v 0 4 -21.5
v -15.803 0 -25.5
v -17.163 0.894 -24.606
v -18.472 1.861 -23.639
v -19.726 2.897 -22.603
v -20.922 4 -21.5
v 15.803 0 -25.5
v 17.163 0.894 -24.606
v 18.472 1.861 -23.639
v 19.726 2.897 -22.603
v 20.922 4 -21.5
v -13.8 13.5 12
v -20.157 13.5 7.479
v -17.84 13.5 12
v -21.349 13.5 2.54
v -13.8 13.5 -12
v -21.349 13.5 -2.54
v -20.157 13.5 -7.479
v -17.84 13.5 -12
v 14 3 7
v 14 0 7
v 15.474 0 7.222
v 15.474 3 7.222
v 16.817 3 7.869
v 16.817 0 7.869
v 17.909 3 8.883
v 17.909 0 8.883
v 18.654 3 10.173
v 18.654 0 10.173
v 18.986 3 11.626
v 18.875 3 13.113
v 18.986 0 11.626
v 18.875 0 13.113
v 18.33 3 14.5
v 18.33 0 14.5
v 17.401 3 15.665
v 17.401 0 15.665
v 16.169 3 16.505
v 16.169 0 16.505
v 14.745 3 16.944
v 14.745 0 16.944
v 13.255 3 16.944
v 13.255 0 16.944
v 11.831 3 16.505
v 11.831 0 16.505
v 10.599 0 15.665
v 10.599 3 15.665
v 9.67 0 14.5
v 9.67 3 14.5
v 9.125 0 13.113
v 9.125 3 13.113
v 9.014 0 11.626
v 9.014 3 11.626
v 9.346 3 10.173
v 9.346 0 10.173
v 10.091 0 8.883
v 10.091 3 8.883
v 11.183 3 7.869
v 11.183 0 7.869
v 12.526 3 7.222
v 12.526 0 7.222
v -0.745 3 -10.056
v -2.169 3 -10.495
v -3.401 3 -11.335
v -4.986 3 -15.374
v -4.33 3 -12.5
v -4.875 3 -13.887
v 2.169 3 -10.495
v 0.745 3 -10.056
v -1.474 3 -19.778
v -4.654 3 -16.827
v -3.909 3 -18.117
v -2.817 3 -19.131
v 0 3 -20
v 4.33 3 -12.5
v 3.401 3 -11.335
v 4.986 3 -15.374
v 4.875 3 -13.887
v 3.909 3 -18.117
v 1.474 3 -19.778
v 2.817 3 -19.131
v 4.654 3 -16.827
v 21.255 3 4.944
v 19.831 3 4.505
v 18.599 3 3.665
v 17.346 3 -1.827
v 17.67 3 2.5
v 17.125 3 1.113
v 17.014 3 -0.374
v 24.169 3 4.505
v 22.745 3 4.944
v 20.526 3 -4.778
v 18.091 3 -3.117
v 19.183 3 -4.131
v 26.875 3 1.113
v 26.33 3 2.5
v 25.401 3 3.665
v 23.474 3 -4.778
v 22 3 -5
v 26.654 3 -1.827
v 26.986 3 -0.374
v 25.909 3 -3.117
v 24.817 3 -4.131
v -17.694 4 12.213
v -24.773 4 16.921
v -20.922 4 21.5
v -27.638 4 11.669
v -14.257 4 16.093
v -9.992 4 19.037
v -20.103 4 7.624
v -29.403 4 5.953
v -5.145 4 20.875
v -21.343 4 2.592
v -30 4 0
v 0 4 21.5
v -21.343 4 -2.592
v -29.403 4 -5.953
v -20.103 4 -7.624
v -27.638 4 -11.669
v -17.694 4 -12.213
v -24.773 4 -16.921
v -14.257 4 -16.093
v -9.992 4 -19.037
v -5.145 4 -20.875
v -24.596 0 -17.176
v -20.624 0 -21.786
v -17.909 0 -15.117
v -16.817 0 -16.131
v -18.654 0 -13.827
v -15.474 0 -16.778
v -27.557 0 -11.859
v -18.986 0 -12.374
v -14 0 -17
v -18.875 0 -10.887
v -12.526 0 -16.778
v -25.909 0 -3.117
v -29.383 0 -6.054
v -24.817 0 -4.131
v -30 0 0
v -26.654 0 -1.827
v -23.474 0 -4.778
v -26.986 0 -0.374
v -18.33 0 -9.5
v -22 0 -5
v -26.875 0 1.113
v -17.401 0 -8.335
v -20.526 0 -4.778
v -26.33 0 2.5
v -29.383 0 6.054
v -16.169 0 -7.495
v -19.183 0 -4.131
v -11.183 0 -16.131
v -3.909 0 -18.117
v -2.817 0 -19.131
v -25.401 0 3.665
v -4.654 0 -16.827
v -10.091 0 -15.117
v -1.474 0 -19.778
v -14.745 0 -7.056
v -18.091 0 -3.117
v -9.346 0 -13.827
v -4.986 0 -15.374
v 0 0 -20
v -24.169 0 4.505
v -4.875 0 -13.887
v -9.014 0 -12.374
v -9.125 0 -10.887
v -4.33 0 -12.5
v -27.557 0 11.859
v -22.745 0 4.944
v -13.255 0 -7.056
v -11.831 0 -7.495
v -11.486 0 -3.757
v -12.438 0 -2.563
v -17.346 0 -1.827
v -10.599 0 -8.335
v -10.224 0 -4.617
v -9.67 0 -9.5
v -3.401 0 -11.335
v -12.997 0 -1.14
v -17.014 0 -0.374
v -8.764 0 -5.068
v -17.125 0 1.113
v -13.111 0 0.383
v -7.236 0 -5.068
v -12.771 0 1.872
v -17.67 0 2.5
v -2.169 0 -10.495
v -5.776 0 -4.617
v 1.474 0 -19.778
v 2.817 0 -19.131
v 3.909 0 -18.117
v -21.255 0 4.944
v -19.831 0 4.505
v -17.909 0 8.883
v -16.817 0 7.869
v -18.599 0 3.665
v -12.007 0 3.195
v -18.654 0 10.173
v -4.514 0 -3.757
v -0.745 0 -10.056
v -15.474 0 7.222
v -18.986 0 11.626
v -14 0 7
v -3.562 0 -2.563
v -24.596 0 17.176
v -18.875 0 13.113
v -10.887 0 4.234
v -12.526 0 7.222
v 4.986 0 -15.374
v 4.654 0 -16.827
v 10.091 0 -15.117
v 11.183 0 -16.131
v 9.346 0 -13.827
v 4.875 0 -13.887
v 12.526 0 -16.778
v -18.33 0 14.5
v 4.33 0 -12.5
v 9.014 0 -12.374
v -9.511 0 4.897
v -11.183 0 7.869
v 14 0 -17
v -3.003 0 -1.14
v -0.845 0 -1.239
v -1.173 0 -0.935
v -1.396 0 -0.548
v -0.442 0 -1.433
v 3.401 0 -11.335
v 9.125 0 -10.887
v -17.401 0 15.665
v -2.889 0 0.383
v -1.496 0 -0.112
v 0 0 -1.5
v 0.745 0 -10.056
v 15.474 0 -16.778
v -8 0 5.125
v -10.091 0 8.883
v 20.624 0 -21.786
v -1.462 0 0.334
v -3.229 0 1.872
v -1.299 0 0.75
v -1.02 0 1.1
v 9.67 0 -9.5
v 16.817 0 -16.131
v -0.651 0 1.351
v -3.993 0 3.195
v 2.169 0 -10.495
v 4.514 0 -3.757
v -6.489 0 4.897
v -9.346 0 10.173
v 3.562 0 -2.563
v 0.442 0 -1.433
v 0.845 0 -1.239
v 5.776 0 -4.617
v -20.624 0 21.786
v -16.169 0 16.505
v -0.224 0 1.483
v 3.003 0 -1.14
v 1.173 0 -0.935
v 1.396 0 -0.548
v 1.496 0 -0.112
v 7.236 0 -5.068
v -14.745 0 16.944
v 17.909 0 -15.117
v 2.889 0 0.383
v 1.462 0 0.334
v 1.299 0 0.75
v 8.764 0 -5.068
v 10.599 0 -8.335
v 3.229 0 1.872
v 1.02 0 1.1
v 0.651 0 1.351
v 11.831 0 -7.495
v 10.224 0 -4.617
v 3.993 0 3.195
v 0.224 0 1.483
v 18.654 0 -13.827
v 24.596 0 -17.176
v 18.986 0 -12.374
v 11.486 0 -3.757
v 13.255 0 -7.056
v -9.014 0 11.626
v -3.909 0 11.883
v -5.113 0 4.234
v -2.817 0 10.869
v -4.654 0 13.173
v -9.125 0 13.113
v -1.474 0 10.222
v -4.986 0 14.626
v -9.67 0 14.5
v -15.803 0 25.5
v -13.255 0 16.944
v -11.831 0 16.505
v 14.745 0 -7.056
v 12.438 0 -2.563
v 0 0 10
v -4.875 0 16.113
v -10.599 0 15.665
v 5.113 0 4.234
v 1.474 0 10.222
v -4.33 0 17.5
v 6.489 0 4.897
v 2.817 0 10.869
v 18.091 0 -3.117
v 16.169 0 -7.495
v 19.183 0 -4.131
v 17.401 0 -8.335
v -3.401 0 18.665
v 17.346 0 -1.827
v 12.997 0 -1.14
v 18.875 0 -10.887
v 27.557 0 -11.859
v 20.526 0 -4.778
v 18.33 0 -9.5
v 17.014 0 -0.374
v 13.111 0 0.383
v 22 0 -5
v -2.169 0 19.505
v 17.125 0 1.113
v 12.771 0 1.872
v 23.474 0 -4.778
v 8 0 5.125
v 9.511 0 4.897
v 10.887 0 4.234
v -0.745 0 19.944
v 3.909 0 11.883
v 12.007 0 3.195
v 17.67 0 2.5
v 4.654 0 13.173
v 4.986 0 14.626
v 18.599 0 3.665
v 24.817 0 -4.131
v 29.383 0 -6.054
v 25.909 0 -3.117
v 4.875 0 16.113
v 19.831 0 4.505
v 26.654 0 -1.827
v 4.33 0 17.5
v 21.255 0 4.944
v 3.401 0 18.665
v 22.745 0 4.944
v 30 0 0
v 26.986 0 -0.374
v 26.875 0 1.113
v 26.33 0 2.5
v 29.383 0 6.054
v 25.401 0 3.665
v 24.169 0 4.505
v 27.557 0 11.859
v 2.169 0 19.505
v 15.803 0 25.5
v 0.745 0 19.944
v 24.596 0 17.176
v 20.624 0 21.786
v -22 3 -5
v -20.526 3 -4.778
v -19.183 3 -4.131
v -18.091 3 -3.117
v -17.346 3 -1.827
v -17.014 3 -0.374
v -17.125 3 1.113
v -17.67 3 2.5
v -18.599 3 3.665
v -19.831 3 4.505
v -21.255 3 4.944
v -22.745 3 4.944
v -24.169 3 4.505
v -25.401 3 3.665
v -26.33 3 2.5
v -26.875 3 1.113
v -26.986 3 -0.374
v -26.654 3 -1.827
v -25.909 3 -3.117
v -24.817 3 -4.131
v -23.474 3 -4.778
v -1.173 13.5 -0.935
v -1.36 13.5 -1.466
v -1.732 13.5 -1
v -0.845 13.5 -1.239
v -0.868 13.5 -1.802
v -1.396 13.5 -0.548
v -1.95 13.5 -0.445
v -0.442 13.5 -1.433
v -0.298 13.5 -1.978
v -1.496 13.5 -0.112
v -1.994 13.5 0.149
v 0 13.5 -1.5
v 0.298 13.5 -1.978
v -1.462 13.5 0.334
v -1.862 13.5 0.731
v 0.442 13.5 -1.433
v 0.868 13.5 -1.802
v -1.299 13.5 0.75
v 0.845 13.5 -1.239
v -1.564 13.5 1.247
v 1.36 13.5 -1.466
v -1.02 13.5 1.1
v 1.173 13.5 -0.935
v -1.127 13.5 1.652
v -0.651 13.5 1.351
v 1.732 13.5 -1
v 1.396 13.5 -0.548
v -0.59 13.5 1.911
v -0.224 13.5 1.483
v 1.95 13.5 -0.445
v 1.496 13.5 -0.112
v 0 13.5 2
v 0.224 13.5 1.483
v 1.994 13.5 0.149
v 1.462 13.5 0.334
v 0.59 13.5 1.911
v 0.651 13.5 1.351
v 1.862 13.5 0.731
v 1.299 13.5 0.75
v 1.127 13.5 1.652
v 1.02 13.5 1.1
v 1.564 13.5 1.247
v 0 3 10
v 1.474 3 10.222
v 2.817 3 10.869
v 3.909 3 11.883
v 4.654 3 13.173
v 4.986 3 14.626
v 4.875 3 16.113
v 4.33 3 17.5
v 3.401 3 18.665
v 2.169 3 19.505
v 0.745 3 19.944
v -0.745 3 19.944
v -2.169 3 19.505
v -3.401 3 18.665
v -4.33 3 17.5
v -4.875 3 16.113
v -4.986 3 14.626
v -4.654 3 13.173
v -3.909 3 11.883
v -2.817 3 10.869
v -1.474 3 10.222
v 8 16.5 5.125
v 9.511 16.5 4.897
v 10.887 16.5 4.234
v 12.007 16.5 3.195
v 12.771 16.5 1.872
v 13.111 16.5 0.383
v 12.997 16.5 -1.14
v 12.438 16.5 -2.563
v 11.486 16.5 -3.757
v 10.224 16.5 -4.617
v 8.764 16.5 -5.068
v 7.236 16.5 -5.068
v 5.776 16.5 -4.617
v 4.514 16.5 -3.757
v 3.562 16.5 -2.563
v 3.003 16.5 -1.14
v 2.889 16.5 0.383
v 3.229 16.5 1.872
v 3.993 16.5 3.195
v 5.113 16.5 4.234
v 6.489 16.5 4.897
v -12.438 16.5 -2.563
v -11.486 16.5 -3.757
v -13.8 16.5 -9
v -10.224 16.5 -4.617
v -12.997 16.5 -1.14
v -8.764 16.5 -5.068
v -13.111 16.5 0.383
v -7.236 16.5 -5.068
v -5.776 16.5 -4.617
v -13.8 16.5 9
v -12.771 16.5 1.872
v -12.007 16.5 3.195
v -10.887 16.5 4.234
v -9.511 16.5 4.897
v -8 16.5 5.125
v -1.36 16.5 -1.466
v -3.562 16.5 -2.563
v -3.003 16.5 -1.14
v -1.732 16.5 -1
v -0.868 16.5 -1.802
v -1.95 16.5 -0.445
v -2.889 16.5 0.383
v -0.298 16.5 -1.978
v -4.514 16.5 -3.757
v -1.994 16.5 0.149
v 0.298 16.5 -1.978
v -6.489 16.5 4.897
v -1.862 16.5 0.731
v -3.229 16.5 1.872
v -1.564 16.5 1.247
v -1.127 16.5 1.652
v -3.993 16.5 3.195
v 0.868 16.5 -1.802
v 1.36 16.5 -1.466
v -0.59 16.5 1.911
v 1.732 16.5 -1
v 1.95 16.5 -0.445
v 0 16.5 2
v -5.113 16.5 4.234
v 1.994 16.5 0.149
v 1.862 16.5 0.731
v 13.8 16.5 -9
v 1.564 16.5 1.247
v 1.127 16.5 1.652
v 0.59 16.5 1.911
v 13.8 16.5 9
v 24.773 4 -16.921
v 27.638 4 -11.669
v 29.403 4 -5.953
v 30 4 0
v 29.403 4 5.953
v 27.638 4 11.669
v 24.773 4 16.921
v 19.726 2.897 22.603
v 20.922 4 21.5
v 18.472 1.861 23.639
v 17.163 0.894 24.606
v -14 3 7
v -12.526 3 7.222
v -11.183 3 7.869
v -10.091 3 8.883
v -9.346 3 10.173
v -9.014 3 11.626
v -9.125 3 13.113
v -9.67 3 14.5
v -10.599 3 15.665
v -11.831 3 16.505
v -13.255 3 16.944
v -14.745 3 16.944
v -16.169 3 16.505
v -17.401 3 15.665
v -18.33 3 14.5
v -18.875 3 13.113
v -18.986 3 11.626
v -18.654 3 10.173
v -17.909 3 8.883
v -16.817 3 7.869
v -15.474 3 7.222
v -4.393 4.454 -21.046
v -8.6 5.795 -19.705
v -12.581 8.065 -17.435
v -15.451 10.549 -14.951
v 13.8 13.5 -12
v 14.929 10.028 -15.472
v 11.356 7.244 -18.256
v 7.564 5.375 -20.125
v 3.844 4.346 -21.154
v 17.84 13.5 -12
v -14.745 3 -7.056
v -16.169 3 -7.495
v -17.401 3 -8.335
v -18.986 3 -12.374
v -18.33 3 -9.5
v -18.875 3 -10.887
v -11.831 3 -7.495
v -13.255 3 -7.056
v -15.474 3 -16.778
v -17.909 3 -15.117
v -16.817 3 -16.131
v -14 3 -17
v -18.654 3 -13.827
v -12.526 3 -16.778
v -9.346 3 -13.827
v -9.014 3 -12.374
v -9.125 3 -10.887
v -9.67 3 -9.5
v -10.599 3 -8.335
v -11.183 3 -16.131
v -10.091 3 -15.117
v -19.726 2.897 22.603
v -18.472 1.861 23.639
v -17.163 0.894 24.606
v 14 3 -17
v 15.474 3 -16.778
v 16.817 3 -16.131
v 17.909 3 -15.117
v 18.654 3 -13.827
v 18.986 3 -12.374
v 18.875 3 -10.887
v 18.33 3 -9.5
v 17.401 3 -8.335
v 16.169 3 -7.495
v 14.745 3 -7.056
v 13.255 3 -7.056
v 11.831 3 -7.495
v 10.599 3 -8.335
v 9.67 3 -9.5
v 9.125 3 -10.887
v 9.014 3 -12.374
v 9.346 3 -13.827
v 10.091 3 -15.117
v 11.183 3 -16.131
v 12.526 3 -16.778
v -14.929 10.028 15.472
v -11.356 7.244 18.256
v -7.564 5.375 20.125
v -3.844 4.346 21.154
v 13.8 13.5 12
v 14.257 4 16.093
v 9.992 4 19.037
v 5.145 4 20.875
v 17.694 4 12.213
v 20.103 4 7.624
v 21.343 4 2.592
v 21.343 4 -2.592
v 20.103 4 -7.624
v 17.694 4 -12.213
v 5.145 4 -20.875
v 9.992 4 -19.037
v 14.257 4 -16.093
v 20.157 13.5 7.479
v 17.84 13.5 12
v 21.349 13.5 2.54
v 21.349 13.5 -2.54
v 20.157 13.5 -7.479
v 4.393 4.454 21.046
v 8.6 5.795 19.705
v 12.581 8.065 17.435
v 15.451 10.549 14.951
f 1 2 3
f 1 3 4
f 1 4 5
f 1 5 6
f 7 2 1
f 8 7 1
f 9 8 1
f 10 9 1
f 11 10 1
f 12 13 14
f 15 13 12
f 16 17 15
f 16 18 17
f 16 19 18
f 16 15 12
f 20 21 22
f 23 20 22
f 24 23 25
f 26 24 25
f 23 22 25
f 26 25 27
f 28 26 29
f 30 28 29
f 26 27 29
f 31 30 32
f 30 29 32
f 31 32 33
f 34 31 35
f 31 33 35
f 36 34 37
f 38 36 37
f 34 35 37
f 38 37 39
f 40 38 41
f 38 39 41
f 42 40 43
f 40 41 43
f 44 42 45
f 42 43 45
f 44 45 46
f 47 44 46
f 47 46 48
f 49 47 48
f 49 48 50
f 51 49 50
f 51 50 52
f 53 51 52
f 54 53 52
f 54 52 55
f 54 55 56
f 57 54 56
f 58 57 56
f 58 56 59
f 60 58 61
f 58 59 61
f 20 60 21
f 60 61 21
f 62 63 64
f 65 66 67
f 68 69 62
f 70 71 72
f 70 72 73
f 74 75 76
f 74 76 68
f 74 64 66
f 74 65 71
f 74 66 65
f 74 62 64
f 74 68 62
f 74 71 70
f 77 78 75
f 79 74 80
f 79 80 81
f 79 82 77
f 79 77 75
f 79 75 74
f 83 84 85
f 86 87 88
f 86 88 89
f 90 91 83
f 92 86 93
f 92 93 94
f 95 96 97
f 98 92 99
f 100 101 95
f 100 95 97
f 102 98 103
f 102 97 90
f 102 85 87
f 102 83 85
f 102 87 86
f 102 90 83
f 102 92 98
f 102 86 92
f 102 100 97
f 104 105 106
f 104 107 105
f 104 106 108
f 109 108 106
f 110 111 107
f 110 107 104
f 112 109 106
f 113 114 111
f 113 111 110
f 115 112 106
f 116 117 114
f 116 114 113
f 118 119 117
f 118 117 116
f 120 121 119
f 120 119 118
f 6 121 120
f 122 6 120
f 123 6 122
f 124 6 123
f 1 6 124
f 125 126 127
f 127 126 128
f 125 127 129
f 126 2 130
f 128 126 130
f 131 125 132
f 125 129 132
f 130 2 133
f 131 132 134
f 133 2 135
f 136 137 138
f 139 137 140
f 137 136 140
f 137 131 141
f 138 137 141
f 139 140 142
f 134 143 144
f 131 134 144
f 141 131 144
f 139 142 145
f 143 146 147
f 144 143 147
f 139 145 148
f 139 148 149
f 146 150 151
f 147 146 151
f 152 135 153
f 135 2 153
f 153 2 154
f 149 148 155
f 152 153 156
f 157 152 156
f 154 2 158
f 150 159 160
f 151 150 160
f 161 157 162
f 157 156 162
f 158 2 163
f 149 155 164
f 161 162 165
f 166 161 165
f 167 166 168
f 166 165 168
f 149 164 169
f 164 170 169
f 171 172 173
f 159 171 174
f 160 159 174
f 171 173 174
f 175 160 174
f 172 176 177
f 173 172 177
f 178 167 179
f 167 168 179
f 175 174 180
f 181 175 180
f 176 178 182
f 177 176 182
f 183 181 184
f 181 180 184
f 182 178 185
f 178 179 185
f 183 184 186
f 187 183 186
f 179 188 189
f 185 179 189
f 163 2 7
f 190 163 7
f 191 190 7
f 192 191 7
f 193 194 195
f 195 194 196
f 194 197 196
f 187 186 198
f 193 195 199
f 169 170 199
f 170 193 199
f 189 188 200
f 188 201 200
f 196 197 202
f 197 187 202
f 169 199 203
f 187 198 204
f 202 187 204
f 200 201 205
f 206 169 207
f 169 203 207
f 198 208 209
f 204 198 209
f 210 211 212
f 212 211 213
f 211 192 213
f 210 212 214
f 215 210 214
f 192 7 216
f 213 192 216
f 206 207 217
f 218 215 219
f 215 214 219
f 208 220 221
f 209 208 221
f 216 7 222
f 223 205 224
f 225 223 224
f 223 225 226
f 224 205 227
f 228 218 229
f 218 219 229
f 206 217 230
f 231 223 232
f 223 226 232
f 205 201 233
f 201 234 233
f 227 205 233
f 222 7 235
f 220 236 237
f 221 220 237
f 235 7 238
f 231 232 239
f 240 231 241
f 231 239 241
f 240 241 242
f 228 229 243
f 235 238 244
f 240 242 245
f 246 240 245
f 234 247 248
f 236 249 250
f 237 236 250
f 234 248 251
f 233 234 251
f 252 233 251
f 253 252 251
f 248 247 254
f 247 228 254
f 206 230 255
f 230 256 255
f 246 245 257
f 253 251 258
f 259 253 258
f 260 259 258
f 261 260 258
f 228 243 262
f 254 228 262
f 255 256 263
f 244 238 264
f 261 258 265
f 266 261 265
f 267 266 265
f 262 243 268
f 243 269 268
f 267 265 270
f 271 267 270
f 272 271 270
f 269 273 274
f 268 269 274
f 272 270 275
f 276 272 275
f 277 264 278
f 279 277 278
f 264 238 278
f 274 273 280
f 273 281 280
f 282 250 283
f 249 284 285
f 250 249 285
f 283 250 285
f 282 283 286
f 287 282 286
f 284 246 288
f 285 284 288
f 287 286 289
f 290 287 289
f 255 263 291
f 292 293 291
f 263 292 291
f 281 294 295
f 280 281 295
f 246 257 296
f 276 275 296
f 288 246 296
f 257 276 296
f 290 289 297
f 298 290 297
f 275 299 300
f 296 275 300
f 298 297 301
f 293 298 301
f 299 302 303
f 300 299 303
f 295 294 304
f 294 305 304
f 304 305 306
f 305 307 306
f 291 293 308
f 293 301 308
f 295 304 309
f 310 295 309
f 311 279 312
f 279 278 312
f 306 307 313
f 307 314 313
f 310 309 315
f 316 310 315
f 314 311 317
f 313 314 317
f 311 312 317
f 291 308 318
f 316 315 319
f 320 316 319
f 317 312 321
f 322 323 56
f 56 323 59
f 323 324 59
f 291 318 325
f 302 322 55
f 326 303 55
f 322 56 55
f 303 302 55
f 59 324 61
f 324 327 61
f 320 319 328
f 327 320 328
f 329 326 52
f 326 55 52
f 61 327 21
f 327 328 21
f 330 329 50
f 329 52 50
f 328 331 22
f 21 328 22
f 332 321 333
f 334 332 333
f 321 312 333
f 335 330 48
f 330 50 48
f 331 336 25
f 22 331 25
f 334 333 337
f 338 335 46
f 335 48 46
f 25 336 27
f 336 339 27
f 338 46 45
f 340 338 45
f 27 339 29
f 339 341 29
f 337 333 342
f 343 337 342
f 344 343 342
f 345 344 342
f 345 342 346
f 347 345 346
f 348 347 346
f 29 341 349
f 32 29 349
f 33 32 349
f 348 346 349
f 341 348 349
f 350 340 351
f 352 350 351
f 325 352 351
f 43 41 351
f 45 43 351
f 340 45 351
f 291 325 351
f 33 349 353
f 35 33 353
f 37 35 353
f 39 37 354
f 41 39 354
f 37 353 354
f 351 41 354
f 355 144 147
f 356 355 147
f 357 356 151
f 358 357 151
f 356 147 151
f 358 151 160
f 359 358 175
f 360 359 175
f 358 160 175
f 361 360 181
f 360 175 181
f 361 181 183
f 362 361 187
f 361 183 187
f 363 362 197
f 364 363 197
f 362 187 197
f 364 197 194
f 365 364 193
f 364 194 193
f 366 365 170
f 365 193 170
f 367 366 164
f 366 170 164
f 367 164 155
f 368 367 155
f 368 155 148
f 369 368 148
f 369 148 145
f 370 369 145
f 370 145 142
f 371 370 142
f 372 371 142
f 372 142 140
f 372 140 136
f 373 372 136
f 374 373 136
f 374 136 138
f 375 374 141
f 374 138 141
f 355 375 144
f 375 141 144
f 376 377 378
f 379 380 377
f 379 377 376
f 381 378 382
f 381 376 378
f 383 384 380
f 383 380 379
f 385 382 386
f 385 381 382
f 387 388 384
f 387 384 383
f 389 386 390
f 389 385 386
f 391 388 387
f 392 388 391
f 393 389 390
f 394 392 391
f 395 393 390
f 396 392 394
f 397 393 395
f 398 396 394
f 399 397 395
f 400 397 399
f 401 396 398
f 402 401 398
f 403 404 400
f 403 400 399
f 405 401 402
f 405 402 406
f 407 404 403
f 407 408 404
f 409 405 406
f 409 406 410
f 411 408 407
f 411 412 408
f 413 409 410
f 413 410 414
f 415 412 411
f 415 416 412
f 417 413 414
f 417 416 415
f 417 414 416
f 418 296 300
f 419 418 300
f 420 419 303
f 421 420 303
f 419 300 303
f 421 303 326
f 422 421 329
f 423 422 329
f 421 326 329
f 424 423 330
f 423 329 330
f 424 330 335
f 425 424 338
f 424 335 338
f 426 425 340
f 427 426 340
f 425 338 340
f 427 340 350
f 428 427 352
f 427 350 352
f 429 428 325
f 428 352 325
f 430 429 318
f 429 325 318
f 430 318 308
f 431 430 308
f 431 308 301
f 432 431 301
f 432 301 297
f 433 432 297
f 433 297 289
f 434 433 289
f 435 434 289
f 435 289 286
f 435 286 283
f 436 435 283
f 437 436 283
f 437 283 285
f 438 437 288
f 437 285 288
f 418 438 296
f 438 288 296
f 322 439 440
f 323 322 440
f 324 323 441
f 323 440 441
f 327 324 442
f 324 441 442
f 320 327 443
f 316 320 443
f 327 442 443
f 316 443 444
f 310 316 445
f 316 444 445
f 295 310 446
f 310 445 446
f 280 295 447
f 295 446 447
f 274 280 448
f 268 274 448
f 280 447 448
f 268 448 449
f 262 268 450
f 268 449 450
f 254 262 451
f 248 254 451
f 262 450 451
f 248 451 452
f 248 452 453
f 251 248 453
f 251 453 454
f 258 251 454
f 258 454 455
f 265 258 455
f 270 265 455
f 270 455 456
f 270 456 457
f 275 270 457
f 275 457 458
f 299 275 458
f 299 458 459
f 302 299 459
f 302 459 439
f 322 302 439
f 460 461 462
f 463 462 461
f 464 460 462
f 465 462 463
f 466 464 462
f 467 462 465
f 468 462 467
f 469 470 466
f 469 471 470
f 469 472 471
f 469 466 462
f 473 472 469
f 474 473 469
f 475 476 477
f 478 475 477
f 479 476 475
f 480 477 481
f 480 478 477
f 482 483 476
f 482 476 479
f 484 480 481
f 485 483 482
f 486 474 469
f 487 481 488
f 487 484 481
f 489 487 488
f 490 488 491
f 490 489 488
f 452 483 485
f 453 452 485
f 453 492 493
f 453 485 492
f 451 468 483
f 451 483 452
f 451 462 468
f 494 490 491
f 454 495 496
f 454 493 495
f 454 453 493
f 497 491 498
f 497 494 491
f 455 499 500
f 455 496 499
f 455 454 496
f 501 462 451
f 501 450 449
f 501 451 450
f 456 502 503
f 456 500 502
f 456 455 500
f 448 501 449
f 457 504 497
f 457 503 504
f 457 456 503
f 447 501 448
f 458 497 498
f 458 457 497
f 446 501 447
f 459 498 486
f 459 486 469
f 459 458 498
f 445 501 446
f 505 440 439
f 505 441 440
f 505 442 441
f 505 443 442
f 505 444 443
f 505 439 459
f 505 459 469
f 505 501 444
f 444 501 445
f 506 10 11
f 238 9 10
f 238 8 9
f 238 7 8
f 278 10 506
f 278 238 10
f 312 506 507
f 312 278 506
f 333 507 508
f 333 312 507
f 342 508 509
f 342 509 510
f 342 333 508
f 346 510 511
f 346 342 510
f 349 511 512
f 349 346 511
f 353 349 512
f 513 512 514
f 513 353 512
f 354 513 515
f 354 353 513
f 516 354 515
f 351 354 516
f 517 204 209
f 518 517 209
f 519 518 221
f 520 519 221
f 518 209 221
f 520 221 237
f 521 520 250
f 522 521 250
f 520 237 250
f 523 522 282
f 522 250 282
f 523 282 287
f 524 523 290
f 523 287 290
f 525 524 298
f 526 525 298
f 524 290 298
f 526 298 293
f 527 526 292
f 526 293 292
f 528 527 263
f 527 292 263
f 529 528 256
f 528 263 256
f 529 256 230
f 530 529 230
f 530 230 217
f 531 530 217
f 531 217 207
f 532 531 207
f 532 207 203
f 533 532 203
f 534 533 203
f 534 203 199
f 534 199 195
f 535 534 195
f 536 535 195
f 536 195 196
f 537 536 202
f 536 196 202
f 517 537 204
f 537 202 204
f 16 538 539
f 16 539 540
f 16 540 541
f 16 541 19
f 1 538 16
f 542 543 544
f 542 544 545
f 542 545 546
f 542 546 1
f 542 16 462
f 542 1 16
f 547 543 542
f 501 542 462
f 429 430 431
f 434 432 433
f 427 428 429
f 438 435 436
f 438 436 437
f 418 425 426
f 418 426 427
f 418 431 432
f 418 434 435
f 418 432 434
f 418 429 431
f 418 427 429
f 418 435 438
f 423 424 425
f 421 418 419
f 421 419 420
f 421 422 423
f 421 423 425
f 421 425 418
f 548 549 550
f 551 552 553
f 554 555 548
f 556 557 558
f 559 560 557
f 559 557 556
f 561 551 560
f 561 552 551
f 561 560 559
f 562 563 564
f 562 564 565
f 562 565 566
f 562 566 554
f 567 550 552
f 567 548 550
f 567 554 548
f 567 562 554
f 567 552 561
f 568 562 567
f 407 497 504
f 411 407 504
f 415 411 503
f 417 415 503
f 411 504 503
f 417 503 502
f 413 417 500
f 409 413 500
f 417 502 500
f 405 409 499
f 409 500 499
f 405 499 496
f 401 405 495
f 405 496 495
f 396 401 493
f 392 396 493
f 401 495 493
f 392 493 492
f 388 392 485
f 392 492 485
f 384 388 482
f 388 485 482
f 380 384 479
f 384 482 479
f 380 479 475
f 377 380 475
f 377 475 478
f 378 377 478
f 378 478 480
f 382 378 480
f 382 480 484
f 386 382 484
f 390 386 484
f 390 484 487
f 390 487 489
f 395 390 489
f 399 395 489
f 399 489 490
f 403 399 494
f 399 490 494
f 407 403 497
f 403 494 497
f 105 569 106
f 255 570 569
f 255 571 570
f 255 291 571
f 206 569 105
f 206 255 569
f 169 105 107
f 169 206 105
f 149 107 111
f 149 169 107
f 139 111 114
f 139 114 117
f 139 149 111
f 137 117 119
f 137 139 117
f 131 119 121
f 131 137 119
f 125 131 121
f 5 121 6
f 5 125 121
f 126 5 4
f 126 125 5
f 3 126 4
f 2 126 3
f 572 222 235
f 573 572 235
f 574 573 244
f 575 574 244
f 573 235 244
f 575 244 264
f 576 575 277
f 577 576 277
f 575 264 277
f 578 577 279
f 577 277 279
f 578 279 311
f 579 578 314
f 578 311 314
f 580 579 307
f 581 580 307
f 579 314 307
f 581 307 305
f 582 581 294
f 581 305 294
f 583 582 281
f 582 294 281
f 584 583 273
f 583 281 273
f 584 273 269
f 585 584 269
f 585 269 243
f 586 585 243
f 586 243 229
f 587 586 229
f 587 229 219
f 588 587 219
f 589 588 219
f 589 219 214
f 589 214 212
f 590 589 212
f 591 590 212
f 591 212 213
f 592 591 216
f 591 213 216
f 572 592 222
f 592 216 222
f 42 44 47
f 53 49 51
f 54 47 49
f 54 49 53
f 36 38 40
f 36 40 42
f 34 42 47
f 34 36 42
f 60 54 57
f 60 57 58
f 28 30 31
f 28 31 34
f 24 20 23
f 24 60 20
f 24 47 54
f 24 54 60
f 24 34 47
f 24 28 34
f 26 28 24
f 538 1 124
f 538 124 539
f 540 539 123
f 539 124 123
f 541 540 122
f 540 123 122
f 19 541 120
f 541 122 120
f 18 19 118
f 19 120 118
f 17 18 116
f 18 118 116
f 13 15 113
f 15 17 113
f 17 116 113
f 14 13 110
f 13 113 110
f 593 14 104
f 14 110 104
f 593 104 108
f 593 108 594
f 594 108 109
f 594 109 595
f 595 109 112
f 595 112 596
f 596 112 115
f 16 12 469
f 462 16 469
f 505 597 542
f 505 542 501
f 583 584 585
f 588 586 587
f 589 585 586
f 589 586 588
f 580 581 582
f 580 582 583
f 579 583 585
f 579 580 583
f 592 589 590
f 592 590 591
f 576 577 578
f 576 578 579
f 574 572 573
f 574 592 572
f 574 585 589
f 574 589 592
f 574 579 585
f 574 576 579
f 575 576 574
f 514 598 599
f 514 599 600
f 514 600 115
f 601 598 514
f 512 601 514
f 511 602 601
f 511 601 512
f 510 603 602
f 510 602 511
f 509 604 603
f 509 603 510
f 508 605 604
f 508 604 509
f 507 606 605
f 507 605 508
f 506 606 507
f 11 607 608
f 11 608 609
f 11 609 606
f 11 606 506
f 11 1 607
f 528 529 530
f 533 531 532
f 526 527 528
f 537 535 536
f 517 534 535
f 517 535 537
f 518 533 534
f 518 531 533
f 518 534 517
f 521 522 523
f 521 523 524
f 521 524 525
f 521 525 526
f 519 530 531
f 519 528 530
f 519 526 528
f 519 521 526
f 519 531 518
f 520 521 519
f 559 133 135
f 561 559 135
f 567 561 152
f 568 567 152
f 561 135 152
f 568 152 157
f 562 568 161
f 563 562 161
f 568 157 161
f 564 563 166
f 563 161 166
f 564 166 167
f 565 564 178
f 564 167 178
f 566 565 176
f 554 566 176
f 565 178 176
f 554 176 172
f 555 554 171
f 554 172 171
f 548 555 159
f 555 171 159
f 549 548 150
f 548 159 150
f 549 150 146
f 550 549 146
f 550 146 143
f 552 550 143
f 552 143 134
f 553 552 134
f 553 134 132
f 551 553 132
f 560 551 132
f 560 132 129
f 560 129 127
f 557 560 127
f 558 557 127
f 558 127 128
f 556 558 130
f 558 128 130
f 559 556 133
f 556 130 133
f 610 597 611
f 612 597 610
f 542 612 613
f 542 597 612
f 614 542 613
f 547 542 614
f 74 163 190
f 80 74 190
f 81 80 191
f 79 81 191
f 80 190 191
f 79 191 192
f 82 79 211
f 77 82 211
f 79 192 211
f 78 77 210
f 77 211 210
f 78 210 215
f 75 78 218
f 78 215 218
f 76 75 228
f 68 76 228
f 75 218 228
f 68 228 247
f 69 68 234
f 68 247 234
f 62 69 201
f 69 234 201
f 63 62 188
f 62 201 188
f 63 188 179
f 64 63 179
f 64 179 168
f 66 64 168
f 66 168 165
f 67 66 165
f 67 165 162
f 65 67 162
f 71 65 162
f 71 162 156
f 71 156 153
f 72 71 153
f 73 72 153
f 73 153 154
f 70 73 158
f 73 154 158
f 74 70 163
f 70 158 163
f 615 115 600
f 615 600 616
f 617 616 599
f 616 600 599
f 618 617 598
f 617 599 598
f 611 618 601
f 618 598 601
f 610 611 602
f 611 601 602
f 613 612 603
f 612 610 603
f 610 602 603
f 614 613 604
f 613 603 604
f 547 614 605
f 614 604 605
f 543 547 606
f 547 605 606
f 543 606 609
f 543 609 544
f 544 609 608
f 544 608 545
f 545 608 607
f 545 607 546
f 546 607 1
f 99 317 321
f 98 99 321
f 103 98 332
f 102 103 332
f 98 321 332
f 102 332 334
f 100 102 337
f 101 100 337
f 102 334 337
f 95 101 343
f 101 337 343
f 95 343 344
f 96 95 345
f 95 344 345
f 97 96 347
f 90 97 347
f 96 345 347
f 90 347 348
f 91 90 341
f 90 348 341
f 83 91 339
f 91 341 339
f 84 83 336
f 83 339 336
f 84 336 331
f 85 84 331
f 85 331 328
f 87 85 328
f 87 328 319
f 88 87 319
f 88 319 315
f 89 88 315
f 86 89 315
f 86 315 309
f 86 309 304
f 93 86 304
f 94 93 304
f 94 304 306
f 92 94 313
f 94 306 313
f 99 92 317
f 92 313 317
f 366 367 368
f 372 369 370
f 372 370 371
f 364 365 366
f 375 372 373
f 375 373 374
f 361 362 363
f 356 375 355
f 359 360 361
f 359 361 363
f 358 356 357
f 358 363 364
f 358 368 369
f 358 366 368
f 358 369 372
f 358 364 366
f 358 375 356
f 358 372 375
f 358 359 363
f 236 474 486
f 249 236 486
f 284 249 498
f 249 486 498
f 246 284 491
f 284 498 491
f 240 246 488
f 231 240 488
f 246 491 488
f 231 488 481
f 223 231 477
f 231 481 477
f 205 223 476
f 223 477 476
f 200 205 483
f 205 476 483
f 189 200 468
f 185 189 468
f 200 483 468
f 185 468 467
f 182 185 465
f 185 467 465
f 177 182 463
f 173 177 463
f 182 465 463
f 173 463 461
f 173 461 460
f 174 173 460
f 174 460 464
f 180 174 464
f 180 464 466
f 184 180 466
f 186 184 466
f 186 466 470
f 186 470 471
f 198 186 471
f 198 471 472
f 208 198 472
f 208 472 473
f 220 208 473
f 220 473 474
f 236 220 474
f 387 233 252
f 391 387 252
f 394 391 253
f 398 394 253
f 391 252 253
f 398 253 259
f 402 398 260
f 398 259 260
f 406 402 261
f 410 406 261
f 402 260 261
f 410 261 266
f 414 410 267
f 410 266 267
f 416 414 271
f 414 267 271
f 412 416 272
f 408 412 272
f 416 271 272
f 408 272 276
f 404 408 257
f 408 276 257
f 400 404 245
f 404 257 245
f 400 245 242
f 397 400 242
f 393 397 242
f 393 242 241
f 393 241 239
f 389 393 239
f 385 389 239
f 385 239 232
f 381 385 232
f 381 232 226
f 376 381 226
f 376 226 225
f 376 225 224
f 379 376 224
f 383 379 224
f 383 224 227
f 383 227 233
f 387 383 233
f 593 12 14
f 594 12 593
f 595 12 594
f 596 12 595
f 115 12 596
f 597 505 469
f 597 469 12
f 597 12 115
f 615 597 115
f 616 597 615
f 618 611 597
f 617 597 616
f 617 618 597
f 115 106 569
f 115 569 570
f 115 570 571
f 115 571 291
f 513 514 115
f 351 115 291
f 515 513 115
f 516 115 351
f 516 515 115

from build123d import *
from build123d.topology import SkipClean

# Parameters (mm, degrees)
SKETCH1_R                            = 30
BOSS_EXTRUDE1_DEPTH                  = 4
BOSS_EXTRUDE2_REACH                  = 44.615
BOSS_EXTRUDE2_END_RADIUS             = 30
BOSS_EXTRUDE2_DIRECTION_2_REACH      = 44.615
BOSS_EXTRUDE2_DIRECTION_2_END_RADIUS = 30
SKETCH3_OUTSIDE_W                    = 78.092
SKETCH3_OUTSIDE_H                    = 69.092
SKETCH3_OUTSIDE_R                    = 21.5
CUT_EXTRUDE2_DEPTH                   = 12.5
BOSS_EXTRUDE3_DEPTH                  = 18
BOSS_EXTRUDE4_DEPTH                  = 15
BOSS_EXTRUDE5_DEPTH                  = 15
CUT_EXTRUDE3_DEPTH                   = 44.292609069
CUT_EXTRUDE3_DEPTH_BACK              = 44.292609069
SKETCH8_R                            = 2
CUT_EXTRUDE8_DEPTH                   = 48.077064479
CUT_EXTRUDE8_DEPTH_BACK              = 48.077064479
CUT_EXTRUDE9_DEPTH                   = 59.659818207
CUT_EXTRUDE11_DEPTH                  = 20
CUT_EXTRUDE12_DEPTH                  = 20
CUT_EXTRUDE13_DEPTH                  = 20
CUT_EXTRUDE14_DEPTH                  = 44.292609069
CUT_EXTRUDE14_DEPTH_BACK             = 44.292609069
SKETCH25_W                           = 66.075437062
SKETCH25_H                           = 20.142243048
SKETCH26_R                           = 5.125
CUT_EXTRUDE15_DEPTH                  = 24
CUT_EXTRUDE17_DEPTH                  = 47.524187258
CUT_EXTRUDE17_DEPTH_BACK             = 47.524187258
SKETCH29_W                           = 7.7
SKETCH29_H                           = 3
CUT_EXTRUDE18_DEPTH                  = 47.524187258
CUT_EXTRUDE18_DEPTH_BACK             = 47.524187258
SKETCH31_W                           = 7.7
SKETCH31_H                           = 3
SKETCH34_R                           = 1.5
CUT_EXTRUDE21_DEPTH                  = 20
SKETCH35_R                           = 2
CUT_EXTRUDE22_DEPTH                  = 3
SKETCH37_R                           = 5
CUT_EXTRUDE23_DEPTH                  = 3


with BuildPart() as part:
    # Sketch1 → Boss-Extrude1 (new body)
    with BuildSketch(Plane(origin=(0, 0, 0), x_dir=(1, 0, 0), z_dir=(0, 1, 0))):
        with Locations(Location((0, 0, 0), (0, 0, 270))):
            Circle(SKETCH1_R)
    extrude(amount=BOSS_EXTRUDE1_DEPTH)

    # Boss-Extrude2: up to this cylinder (the profile starts inside it)
    with SkipClean():  # the faces are left unmerged after this step: merging them gives an invalid solid
        boss_extrude2_end = Plane(origin=(0, 9.396175, 0), z_dir=(0, -1, 0)) * Cylinder(BOSS_EXTRUDE2_END_RADIUS, 150.23, mode=Mode.PRIVATE)
        # Sketch2 → Boss-Extrude2 (add, up to the surface)
        with BuildSketch(Plane(origin=(0, 0, 0), x_dir=(0, 0, -1), z_dir=(1, 0, 0)), mode=Mode.PRIVATE) as boss_extrude2_sk1:
            Polygon((0, 4), (21.5, 4), (9, 16.5), (-9, 16.5), (-21.5, 4), align=None)
        boss_extrude2_tool1 = extrude(boss_extrude2_sk1.sketch, amount=BOSS_EXTRUDE2_REACH, mode=Mode.PRIVATE) & boss_extrude2_end
        add(boss_extrude2_tool1.solids().sort_by_distance((0, 9.396175, 0))[0])

    # Boss-Extrude2 direction 2: up to this cylinder (the profile starts inside it)
    with SkipClean():  # the faces are left unmerged after this step: merging them gives an invalid solid
        boss_extrude2_direction_2_end = Plane(origin=(0, 9.396175, 0), z_dir=(0, -1, 0)) * Cylinder(BOSS_EXTRUDE2_DIRECTION_2_END_RADIUS, 150.23, mode=Mode.PRIVATE)
        # Sketch2 → Boss-Extrude2 direction 2 (add, up to the surface)
        with BuildSketch(Plane(origin=(0, 0, 0), x_dir=(0, 0, -1), z_dir=(1, 0, 0)), mode=Mode.PRIVATE) as boss_extrude2_direction_2_sk1:
            Polygon((0, 4), (21.5, 4), (9, 16.5), (-9, 16.5), (-21.5, 4), align=None)
        boss_extrude2_direction_2_tool1 = extrude(boss_extrude2_direction_2_sk1.sketch, amount=-BOSS_EXTRUDE2_DIRECTION_2_REACH, mode=Mode.PRIVATE) & boss_extrude2_direction_2_end
        add(boss_extrude2_direction_2_tool1.solids().sort_by_distance((0, 9.396175, 0))[0])

    # SurfaceCut1
    split(bisect_by=Plane(origin=(0, 12.75, -12.75), x_dir=(1, 0, 0), z_dir=(0, 0.7071067811865558, -0.7071067811865392)), keep=Keep.BOTTOM)

    # SurfaceCut2
    split(bisect_by=Plane(origin=(0, 12.75, 12.75), x_dir=(1, 0, 0), z_dir=(0, 0.7071067811865509, 0.7071067811865442)), keep=Keep.BOTTOM)

    # Sketch3 outside → Cut-Extrude2 (cut)
    with BuildSketch(Plane(origin=(0, 4, 0), x_dir=(1, 0, 0), z_dir=(0, 1, 0))):
        Rectangle(SKETCH3_OUTSIDE_W, SKETCH3_OUTSIDE_H)
        Circle(SKETCH3_OUTSIDE_R, mode=Mode.SUBTRACT)
    extrude(amount=CUT_EXTRUDE2_DEPTH, mode=Mode.SUBTRACT)

    # Sketch5 → Boss-Extrude3 (add)
    with BuildSketch(Plane(origin=(0, 0, 0), x_dir=(-1, 0, 0), z_dir=(0, -1, 0))):
        Polygon((0, -6), (-17.5, -6), (-17.5, 6), (17.5, 6), (17.5, -6), align=None)
    extrude(amount=BOSS_EXTRUDE3_DEPTH)

    # Sketch6 → Boss-Extrude4 (add)
    with BuildSketch(Plane.XZ):
        Polygon((0, 15), (7, 15), (7, 6), (-7, 6), (-7, 15), align=None)
    extrude(amount=BOSS_EXTRUDE4_DEPTH)

    # Sketch7 → Boss-Extrude5 (add)
    with BuildSketch(Plane.XZ):
        Polygon((0, -15), (7, -15), (7, -6), (-7, -6), (-7, -15), align=None)
    extrude(amount=BOSS_EXTRUDE5_DEPTH)

    # Sketch8 → Cut-Extrude3 (cut, two sides: drawn at the far end of the back side and taken through both)
    with BuildSketch(Plane.XY.offset(-CUT_EXTRUDE3_DEPTH_BACK)):
        with Locations((-12.5, -12.5)):
            Circle(SKETCH8_R)
        with Locations((12.5, -12.5)):
            Circle(SKETCH8_R)
    extrude(amount=CUT_EXTRUDE3_DEPTH + CUT_EXTRUDE3_DEPTH_BACK, mode=Mode.SUBTRACT)

    # Sketch16 → Cut-Extrude8 (cut, two sides: drawn at the far end of the back side and taken through both)
    with BuildSketch(Plane.XY.offset(6).offset(-CUT_EXTRUDE8_DEPTH_BACK)):
        Polygon((17.5, -18), (17.5, -14.5), (14, -18), align=None)
        Polygon((-17.5, -18), (-14, -18), (-17.5, -14.5), align=None)
    extrude(amount=CUT_EXTRUDE8_DEPTH + CUT_EXTRUDE8_DEPTH_BACK, mode=Mode.SUBTRACT)

    # Sketch17 → Cut-Extrude9 (cut, through all)
    with BuildSketch(Plane(origin=(10.365975269, -9.674910251, -8.062425209), x_dir=(-0.3613483622370374, 0.337258471421235, -0.8693009171531012), z_dir=(0.6355070151731325, -0.5931398808282571, -0.49428323402354774))):
        Polygon((-2.372510104, -6.189601271), (7.980636686, -0.706686759), (7.980636686, -10.965829024), align=None)
    extrude(amount=CUT_EXTRUDE9_DEPTH, mode=Mode.SUBTRACT)

    # Sketch19 → Cut-Extrude11 (cut)
    with BuildSketch(Plane(origin=(-10.365975269, -9.674910251, -8.062425209), x_dir=(0.3613483622370374, 0.33725847142123494, -0.8693009171531012), z_dir=(0.6355070151731324, 0.5931398808282571, 0.4942832340235476))):
        Polygon((-2.372510104, -6.189601271), (7.980636686, -10.965829024), (7.980636686, -0.706686759), align=None)
    extrude(amount=-CUT_EXTRUDE11_DEPTH, mode=Mode.SUBTRACT)

    # Sketch20 → Cut-Extrude12 (cut)
    with BuildSketch(Plane(origin=(-10.365975269, -9.674910251, 8.062425209), x_dir=(-0.3613483622370374, -0.3372584714212349, -0.8693009171531013), z_dir=(0.6355070151731326, 0.593139880828257, -0.49428323402354757))):
        Polygon((2.372510104, -6.189601271), (-7.980636686, -0.706686759), (-7.980636686, -10.965829024), align=None)
    extrude(amount=-CUT_EXTRUDE12_DEPTH, mode=Mode.SUBTRACT)

    # Sketch21 → Cut-Extrude13 (cut)
    with BuildSketch(Plane(origin=(10.365975269, -9.674910251, 8.062425209), x_dir=(-0.3613483622370374, 0.3372584714212349, 0.8693009171531013), z_dir=(-0.6355070151731326, 0.593139880828257, -0.49428323402354757))):
        Polygon((-2.372510104, -6.189601271), (7.980636686, -0.706686759), (7.980636686, -10.965829024), align=None)
    extrude(amount=-CUT_EXTRUDE13_DEPTH, mode=Mode.SUBTRACT)

    # Sketch25 → Cut-Extrude14 (cut, two sides: drawn at the far end of the back side and taken through both)
    with BuildSketch(Plane.XY.offset(-CUT_EXTRUDE14_DEPTH_BACK)):
        with Locations((0, -10.071121524)):
            Rectangle(SKETCH25_W, SKETCH25_H)
    extrude(amount=CUT_EXTRUDE14_DEPTH + CUT_EXTRUDE14_DEPTH_BACK, mode=Mode.SUBTRACT)

    # Sketch26 → Cut-Extrude15 (cut)
    with BuildSketch(Plane(origin=(0, 16.5, 0), x_dir=(1, 0, 0), z_dir=(0, 1, 0))):
        with Locations(Location((-8, 0, 0), (0, 0, 270))):
            Circle(SKETCH26_R)
        with Locations(Location((8, 0, 0), (0, 0, 270))):
            Circle(SKETCH26_R)
    extrude(amount=-CUT_EXTRUDE15_DEPTH, mode=Mode.SUBTRACT)

    # Sketch29 → Cut-Extrude17 (cut, two sides: drawn at the far end of the back side and taken through both)
    with BuildSketch(Plane.XY.offset(6).offset(-CUT_EXTRUDE17_DEPTH_BACK)):
        with Locations((17.65, 15)):
            Rectangle(SKETCH29_W, SKETCH29_H)
    extrude(amount=CUT_EXTRUDE17_DEPTH + CUT_EXTRUDE17_DEPTH_BACK, mode=Mode.SUBTRACT)

    # Sketch31 → Cut-Extrude18 (cut, two sides: drawn at the far end of the back side and taken through both)
    with BuildSketch(Plane.XY.offset(6).offset(-CUT_EXTRUDE18_DEPTH_BACK)):
        with Locations((-17.65, 15)):
            Rectangle(SKETCH31_W, SKETCH31_H)
    extrude(amount=CUT_EXTRUDE18_DEPTH + CUT_EXTRUDE18_DEPTH_BACK, mode=Mode.SUBTRACT)

    # Sketch34 → Cut-Extrude21 (cut)
    with BuildSketch(Plane.XZ):
        with Locations(Location((0, 0, 0), (0, 0, 270))):
            Circle(SKETCH34_R)
    extrude(amount=-CUT_EXTRUDE21_DEPTH, mode=Mode.SUBTRACT)

    # Sketch35 → Cut-Extrude22 (cut)
    with BuildSketch(Plane(origin=(0, 16.5, 0), x_dir=(1, 0, 0), z_dir=(0, 1, 0))):
        with Locations(Location((0, 0, 0), (0, 0, 270))):
            Circle(SKETCH35_R)
    extrude(amount=-CUT_EXTRUDE22_DEPTH, mode=Mode.SUBTRACT)

    # Sketch37 → Cut-Extrude23 (cut)
    with BuildSketch(Plane.XZ):
        with Locations(Location((0, -15, 0), (0, 0, 270))):
            Circle(SKETCH37_R)
        with Locations(Location((0, 15, 0), (0, 0, 270))):
            Circle(SKETCH37_R)
        with Locations(Location((-22, 0, 0), (0, 0, 270))):
            Circle(SKETCH37_R)
        with Locations(Location((22, 0, 0), (0, 0, 270))):
            Circle(SKETCH37_R)
        with Locations(Location((-14, 12, 0), (0, 0, 270))):
            Circle(SKETCH37_R)
        with Locations(Location((14, 12, 0), (0, 0, 270))):
            Circle(SKETCH37_R)
        with Locations(Location((-14, -12, 0), (0, 0, 270))):
            Circle(SKETCH37_R)
        with Locations(Location((14, -12, 0), (0, 0, 270))):
            Circle(SKETCH37_R)
    extrude(amount=-CUT_EXTRUDE23_DEPTH, mode=Mode.SUBTRACT)


solid = part.part
